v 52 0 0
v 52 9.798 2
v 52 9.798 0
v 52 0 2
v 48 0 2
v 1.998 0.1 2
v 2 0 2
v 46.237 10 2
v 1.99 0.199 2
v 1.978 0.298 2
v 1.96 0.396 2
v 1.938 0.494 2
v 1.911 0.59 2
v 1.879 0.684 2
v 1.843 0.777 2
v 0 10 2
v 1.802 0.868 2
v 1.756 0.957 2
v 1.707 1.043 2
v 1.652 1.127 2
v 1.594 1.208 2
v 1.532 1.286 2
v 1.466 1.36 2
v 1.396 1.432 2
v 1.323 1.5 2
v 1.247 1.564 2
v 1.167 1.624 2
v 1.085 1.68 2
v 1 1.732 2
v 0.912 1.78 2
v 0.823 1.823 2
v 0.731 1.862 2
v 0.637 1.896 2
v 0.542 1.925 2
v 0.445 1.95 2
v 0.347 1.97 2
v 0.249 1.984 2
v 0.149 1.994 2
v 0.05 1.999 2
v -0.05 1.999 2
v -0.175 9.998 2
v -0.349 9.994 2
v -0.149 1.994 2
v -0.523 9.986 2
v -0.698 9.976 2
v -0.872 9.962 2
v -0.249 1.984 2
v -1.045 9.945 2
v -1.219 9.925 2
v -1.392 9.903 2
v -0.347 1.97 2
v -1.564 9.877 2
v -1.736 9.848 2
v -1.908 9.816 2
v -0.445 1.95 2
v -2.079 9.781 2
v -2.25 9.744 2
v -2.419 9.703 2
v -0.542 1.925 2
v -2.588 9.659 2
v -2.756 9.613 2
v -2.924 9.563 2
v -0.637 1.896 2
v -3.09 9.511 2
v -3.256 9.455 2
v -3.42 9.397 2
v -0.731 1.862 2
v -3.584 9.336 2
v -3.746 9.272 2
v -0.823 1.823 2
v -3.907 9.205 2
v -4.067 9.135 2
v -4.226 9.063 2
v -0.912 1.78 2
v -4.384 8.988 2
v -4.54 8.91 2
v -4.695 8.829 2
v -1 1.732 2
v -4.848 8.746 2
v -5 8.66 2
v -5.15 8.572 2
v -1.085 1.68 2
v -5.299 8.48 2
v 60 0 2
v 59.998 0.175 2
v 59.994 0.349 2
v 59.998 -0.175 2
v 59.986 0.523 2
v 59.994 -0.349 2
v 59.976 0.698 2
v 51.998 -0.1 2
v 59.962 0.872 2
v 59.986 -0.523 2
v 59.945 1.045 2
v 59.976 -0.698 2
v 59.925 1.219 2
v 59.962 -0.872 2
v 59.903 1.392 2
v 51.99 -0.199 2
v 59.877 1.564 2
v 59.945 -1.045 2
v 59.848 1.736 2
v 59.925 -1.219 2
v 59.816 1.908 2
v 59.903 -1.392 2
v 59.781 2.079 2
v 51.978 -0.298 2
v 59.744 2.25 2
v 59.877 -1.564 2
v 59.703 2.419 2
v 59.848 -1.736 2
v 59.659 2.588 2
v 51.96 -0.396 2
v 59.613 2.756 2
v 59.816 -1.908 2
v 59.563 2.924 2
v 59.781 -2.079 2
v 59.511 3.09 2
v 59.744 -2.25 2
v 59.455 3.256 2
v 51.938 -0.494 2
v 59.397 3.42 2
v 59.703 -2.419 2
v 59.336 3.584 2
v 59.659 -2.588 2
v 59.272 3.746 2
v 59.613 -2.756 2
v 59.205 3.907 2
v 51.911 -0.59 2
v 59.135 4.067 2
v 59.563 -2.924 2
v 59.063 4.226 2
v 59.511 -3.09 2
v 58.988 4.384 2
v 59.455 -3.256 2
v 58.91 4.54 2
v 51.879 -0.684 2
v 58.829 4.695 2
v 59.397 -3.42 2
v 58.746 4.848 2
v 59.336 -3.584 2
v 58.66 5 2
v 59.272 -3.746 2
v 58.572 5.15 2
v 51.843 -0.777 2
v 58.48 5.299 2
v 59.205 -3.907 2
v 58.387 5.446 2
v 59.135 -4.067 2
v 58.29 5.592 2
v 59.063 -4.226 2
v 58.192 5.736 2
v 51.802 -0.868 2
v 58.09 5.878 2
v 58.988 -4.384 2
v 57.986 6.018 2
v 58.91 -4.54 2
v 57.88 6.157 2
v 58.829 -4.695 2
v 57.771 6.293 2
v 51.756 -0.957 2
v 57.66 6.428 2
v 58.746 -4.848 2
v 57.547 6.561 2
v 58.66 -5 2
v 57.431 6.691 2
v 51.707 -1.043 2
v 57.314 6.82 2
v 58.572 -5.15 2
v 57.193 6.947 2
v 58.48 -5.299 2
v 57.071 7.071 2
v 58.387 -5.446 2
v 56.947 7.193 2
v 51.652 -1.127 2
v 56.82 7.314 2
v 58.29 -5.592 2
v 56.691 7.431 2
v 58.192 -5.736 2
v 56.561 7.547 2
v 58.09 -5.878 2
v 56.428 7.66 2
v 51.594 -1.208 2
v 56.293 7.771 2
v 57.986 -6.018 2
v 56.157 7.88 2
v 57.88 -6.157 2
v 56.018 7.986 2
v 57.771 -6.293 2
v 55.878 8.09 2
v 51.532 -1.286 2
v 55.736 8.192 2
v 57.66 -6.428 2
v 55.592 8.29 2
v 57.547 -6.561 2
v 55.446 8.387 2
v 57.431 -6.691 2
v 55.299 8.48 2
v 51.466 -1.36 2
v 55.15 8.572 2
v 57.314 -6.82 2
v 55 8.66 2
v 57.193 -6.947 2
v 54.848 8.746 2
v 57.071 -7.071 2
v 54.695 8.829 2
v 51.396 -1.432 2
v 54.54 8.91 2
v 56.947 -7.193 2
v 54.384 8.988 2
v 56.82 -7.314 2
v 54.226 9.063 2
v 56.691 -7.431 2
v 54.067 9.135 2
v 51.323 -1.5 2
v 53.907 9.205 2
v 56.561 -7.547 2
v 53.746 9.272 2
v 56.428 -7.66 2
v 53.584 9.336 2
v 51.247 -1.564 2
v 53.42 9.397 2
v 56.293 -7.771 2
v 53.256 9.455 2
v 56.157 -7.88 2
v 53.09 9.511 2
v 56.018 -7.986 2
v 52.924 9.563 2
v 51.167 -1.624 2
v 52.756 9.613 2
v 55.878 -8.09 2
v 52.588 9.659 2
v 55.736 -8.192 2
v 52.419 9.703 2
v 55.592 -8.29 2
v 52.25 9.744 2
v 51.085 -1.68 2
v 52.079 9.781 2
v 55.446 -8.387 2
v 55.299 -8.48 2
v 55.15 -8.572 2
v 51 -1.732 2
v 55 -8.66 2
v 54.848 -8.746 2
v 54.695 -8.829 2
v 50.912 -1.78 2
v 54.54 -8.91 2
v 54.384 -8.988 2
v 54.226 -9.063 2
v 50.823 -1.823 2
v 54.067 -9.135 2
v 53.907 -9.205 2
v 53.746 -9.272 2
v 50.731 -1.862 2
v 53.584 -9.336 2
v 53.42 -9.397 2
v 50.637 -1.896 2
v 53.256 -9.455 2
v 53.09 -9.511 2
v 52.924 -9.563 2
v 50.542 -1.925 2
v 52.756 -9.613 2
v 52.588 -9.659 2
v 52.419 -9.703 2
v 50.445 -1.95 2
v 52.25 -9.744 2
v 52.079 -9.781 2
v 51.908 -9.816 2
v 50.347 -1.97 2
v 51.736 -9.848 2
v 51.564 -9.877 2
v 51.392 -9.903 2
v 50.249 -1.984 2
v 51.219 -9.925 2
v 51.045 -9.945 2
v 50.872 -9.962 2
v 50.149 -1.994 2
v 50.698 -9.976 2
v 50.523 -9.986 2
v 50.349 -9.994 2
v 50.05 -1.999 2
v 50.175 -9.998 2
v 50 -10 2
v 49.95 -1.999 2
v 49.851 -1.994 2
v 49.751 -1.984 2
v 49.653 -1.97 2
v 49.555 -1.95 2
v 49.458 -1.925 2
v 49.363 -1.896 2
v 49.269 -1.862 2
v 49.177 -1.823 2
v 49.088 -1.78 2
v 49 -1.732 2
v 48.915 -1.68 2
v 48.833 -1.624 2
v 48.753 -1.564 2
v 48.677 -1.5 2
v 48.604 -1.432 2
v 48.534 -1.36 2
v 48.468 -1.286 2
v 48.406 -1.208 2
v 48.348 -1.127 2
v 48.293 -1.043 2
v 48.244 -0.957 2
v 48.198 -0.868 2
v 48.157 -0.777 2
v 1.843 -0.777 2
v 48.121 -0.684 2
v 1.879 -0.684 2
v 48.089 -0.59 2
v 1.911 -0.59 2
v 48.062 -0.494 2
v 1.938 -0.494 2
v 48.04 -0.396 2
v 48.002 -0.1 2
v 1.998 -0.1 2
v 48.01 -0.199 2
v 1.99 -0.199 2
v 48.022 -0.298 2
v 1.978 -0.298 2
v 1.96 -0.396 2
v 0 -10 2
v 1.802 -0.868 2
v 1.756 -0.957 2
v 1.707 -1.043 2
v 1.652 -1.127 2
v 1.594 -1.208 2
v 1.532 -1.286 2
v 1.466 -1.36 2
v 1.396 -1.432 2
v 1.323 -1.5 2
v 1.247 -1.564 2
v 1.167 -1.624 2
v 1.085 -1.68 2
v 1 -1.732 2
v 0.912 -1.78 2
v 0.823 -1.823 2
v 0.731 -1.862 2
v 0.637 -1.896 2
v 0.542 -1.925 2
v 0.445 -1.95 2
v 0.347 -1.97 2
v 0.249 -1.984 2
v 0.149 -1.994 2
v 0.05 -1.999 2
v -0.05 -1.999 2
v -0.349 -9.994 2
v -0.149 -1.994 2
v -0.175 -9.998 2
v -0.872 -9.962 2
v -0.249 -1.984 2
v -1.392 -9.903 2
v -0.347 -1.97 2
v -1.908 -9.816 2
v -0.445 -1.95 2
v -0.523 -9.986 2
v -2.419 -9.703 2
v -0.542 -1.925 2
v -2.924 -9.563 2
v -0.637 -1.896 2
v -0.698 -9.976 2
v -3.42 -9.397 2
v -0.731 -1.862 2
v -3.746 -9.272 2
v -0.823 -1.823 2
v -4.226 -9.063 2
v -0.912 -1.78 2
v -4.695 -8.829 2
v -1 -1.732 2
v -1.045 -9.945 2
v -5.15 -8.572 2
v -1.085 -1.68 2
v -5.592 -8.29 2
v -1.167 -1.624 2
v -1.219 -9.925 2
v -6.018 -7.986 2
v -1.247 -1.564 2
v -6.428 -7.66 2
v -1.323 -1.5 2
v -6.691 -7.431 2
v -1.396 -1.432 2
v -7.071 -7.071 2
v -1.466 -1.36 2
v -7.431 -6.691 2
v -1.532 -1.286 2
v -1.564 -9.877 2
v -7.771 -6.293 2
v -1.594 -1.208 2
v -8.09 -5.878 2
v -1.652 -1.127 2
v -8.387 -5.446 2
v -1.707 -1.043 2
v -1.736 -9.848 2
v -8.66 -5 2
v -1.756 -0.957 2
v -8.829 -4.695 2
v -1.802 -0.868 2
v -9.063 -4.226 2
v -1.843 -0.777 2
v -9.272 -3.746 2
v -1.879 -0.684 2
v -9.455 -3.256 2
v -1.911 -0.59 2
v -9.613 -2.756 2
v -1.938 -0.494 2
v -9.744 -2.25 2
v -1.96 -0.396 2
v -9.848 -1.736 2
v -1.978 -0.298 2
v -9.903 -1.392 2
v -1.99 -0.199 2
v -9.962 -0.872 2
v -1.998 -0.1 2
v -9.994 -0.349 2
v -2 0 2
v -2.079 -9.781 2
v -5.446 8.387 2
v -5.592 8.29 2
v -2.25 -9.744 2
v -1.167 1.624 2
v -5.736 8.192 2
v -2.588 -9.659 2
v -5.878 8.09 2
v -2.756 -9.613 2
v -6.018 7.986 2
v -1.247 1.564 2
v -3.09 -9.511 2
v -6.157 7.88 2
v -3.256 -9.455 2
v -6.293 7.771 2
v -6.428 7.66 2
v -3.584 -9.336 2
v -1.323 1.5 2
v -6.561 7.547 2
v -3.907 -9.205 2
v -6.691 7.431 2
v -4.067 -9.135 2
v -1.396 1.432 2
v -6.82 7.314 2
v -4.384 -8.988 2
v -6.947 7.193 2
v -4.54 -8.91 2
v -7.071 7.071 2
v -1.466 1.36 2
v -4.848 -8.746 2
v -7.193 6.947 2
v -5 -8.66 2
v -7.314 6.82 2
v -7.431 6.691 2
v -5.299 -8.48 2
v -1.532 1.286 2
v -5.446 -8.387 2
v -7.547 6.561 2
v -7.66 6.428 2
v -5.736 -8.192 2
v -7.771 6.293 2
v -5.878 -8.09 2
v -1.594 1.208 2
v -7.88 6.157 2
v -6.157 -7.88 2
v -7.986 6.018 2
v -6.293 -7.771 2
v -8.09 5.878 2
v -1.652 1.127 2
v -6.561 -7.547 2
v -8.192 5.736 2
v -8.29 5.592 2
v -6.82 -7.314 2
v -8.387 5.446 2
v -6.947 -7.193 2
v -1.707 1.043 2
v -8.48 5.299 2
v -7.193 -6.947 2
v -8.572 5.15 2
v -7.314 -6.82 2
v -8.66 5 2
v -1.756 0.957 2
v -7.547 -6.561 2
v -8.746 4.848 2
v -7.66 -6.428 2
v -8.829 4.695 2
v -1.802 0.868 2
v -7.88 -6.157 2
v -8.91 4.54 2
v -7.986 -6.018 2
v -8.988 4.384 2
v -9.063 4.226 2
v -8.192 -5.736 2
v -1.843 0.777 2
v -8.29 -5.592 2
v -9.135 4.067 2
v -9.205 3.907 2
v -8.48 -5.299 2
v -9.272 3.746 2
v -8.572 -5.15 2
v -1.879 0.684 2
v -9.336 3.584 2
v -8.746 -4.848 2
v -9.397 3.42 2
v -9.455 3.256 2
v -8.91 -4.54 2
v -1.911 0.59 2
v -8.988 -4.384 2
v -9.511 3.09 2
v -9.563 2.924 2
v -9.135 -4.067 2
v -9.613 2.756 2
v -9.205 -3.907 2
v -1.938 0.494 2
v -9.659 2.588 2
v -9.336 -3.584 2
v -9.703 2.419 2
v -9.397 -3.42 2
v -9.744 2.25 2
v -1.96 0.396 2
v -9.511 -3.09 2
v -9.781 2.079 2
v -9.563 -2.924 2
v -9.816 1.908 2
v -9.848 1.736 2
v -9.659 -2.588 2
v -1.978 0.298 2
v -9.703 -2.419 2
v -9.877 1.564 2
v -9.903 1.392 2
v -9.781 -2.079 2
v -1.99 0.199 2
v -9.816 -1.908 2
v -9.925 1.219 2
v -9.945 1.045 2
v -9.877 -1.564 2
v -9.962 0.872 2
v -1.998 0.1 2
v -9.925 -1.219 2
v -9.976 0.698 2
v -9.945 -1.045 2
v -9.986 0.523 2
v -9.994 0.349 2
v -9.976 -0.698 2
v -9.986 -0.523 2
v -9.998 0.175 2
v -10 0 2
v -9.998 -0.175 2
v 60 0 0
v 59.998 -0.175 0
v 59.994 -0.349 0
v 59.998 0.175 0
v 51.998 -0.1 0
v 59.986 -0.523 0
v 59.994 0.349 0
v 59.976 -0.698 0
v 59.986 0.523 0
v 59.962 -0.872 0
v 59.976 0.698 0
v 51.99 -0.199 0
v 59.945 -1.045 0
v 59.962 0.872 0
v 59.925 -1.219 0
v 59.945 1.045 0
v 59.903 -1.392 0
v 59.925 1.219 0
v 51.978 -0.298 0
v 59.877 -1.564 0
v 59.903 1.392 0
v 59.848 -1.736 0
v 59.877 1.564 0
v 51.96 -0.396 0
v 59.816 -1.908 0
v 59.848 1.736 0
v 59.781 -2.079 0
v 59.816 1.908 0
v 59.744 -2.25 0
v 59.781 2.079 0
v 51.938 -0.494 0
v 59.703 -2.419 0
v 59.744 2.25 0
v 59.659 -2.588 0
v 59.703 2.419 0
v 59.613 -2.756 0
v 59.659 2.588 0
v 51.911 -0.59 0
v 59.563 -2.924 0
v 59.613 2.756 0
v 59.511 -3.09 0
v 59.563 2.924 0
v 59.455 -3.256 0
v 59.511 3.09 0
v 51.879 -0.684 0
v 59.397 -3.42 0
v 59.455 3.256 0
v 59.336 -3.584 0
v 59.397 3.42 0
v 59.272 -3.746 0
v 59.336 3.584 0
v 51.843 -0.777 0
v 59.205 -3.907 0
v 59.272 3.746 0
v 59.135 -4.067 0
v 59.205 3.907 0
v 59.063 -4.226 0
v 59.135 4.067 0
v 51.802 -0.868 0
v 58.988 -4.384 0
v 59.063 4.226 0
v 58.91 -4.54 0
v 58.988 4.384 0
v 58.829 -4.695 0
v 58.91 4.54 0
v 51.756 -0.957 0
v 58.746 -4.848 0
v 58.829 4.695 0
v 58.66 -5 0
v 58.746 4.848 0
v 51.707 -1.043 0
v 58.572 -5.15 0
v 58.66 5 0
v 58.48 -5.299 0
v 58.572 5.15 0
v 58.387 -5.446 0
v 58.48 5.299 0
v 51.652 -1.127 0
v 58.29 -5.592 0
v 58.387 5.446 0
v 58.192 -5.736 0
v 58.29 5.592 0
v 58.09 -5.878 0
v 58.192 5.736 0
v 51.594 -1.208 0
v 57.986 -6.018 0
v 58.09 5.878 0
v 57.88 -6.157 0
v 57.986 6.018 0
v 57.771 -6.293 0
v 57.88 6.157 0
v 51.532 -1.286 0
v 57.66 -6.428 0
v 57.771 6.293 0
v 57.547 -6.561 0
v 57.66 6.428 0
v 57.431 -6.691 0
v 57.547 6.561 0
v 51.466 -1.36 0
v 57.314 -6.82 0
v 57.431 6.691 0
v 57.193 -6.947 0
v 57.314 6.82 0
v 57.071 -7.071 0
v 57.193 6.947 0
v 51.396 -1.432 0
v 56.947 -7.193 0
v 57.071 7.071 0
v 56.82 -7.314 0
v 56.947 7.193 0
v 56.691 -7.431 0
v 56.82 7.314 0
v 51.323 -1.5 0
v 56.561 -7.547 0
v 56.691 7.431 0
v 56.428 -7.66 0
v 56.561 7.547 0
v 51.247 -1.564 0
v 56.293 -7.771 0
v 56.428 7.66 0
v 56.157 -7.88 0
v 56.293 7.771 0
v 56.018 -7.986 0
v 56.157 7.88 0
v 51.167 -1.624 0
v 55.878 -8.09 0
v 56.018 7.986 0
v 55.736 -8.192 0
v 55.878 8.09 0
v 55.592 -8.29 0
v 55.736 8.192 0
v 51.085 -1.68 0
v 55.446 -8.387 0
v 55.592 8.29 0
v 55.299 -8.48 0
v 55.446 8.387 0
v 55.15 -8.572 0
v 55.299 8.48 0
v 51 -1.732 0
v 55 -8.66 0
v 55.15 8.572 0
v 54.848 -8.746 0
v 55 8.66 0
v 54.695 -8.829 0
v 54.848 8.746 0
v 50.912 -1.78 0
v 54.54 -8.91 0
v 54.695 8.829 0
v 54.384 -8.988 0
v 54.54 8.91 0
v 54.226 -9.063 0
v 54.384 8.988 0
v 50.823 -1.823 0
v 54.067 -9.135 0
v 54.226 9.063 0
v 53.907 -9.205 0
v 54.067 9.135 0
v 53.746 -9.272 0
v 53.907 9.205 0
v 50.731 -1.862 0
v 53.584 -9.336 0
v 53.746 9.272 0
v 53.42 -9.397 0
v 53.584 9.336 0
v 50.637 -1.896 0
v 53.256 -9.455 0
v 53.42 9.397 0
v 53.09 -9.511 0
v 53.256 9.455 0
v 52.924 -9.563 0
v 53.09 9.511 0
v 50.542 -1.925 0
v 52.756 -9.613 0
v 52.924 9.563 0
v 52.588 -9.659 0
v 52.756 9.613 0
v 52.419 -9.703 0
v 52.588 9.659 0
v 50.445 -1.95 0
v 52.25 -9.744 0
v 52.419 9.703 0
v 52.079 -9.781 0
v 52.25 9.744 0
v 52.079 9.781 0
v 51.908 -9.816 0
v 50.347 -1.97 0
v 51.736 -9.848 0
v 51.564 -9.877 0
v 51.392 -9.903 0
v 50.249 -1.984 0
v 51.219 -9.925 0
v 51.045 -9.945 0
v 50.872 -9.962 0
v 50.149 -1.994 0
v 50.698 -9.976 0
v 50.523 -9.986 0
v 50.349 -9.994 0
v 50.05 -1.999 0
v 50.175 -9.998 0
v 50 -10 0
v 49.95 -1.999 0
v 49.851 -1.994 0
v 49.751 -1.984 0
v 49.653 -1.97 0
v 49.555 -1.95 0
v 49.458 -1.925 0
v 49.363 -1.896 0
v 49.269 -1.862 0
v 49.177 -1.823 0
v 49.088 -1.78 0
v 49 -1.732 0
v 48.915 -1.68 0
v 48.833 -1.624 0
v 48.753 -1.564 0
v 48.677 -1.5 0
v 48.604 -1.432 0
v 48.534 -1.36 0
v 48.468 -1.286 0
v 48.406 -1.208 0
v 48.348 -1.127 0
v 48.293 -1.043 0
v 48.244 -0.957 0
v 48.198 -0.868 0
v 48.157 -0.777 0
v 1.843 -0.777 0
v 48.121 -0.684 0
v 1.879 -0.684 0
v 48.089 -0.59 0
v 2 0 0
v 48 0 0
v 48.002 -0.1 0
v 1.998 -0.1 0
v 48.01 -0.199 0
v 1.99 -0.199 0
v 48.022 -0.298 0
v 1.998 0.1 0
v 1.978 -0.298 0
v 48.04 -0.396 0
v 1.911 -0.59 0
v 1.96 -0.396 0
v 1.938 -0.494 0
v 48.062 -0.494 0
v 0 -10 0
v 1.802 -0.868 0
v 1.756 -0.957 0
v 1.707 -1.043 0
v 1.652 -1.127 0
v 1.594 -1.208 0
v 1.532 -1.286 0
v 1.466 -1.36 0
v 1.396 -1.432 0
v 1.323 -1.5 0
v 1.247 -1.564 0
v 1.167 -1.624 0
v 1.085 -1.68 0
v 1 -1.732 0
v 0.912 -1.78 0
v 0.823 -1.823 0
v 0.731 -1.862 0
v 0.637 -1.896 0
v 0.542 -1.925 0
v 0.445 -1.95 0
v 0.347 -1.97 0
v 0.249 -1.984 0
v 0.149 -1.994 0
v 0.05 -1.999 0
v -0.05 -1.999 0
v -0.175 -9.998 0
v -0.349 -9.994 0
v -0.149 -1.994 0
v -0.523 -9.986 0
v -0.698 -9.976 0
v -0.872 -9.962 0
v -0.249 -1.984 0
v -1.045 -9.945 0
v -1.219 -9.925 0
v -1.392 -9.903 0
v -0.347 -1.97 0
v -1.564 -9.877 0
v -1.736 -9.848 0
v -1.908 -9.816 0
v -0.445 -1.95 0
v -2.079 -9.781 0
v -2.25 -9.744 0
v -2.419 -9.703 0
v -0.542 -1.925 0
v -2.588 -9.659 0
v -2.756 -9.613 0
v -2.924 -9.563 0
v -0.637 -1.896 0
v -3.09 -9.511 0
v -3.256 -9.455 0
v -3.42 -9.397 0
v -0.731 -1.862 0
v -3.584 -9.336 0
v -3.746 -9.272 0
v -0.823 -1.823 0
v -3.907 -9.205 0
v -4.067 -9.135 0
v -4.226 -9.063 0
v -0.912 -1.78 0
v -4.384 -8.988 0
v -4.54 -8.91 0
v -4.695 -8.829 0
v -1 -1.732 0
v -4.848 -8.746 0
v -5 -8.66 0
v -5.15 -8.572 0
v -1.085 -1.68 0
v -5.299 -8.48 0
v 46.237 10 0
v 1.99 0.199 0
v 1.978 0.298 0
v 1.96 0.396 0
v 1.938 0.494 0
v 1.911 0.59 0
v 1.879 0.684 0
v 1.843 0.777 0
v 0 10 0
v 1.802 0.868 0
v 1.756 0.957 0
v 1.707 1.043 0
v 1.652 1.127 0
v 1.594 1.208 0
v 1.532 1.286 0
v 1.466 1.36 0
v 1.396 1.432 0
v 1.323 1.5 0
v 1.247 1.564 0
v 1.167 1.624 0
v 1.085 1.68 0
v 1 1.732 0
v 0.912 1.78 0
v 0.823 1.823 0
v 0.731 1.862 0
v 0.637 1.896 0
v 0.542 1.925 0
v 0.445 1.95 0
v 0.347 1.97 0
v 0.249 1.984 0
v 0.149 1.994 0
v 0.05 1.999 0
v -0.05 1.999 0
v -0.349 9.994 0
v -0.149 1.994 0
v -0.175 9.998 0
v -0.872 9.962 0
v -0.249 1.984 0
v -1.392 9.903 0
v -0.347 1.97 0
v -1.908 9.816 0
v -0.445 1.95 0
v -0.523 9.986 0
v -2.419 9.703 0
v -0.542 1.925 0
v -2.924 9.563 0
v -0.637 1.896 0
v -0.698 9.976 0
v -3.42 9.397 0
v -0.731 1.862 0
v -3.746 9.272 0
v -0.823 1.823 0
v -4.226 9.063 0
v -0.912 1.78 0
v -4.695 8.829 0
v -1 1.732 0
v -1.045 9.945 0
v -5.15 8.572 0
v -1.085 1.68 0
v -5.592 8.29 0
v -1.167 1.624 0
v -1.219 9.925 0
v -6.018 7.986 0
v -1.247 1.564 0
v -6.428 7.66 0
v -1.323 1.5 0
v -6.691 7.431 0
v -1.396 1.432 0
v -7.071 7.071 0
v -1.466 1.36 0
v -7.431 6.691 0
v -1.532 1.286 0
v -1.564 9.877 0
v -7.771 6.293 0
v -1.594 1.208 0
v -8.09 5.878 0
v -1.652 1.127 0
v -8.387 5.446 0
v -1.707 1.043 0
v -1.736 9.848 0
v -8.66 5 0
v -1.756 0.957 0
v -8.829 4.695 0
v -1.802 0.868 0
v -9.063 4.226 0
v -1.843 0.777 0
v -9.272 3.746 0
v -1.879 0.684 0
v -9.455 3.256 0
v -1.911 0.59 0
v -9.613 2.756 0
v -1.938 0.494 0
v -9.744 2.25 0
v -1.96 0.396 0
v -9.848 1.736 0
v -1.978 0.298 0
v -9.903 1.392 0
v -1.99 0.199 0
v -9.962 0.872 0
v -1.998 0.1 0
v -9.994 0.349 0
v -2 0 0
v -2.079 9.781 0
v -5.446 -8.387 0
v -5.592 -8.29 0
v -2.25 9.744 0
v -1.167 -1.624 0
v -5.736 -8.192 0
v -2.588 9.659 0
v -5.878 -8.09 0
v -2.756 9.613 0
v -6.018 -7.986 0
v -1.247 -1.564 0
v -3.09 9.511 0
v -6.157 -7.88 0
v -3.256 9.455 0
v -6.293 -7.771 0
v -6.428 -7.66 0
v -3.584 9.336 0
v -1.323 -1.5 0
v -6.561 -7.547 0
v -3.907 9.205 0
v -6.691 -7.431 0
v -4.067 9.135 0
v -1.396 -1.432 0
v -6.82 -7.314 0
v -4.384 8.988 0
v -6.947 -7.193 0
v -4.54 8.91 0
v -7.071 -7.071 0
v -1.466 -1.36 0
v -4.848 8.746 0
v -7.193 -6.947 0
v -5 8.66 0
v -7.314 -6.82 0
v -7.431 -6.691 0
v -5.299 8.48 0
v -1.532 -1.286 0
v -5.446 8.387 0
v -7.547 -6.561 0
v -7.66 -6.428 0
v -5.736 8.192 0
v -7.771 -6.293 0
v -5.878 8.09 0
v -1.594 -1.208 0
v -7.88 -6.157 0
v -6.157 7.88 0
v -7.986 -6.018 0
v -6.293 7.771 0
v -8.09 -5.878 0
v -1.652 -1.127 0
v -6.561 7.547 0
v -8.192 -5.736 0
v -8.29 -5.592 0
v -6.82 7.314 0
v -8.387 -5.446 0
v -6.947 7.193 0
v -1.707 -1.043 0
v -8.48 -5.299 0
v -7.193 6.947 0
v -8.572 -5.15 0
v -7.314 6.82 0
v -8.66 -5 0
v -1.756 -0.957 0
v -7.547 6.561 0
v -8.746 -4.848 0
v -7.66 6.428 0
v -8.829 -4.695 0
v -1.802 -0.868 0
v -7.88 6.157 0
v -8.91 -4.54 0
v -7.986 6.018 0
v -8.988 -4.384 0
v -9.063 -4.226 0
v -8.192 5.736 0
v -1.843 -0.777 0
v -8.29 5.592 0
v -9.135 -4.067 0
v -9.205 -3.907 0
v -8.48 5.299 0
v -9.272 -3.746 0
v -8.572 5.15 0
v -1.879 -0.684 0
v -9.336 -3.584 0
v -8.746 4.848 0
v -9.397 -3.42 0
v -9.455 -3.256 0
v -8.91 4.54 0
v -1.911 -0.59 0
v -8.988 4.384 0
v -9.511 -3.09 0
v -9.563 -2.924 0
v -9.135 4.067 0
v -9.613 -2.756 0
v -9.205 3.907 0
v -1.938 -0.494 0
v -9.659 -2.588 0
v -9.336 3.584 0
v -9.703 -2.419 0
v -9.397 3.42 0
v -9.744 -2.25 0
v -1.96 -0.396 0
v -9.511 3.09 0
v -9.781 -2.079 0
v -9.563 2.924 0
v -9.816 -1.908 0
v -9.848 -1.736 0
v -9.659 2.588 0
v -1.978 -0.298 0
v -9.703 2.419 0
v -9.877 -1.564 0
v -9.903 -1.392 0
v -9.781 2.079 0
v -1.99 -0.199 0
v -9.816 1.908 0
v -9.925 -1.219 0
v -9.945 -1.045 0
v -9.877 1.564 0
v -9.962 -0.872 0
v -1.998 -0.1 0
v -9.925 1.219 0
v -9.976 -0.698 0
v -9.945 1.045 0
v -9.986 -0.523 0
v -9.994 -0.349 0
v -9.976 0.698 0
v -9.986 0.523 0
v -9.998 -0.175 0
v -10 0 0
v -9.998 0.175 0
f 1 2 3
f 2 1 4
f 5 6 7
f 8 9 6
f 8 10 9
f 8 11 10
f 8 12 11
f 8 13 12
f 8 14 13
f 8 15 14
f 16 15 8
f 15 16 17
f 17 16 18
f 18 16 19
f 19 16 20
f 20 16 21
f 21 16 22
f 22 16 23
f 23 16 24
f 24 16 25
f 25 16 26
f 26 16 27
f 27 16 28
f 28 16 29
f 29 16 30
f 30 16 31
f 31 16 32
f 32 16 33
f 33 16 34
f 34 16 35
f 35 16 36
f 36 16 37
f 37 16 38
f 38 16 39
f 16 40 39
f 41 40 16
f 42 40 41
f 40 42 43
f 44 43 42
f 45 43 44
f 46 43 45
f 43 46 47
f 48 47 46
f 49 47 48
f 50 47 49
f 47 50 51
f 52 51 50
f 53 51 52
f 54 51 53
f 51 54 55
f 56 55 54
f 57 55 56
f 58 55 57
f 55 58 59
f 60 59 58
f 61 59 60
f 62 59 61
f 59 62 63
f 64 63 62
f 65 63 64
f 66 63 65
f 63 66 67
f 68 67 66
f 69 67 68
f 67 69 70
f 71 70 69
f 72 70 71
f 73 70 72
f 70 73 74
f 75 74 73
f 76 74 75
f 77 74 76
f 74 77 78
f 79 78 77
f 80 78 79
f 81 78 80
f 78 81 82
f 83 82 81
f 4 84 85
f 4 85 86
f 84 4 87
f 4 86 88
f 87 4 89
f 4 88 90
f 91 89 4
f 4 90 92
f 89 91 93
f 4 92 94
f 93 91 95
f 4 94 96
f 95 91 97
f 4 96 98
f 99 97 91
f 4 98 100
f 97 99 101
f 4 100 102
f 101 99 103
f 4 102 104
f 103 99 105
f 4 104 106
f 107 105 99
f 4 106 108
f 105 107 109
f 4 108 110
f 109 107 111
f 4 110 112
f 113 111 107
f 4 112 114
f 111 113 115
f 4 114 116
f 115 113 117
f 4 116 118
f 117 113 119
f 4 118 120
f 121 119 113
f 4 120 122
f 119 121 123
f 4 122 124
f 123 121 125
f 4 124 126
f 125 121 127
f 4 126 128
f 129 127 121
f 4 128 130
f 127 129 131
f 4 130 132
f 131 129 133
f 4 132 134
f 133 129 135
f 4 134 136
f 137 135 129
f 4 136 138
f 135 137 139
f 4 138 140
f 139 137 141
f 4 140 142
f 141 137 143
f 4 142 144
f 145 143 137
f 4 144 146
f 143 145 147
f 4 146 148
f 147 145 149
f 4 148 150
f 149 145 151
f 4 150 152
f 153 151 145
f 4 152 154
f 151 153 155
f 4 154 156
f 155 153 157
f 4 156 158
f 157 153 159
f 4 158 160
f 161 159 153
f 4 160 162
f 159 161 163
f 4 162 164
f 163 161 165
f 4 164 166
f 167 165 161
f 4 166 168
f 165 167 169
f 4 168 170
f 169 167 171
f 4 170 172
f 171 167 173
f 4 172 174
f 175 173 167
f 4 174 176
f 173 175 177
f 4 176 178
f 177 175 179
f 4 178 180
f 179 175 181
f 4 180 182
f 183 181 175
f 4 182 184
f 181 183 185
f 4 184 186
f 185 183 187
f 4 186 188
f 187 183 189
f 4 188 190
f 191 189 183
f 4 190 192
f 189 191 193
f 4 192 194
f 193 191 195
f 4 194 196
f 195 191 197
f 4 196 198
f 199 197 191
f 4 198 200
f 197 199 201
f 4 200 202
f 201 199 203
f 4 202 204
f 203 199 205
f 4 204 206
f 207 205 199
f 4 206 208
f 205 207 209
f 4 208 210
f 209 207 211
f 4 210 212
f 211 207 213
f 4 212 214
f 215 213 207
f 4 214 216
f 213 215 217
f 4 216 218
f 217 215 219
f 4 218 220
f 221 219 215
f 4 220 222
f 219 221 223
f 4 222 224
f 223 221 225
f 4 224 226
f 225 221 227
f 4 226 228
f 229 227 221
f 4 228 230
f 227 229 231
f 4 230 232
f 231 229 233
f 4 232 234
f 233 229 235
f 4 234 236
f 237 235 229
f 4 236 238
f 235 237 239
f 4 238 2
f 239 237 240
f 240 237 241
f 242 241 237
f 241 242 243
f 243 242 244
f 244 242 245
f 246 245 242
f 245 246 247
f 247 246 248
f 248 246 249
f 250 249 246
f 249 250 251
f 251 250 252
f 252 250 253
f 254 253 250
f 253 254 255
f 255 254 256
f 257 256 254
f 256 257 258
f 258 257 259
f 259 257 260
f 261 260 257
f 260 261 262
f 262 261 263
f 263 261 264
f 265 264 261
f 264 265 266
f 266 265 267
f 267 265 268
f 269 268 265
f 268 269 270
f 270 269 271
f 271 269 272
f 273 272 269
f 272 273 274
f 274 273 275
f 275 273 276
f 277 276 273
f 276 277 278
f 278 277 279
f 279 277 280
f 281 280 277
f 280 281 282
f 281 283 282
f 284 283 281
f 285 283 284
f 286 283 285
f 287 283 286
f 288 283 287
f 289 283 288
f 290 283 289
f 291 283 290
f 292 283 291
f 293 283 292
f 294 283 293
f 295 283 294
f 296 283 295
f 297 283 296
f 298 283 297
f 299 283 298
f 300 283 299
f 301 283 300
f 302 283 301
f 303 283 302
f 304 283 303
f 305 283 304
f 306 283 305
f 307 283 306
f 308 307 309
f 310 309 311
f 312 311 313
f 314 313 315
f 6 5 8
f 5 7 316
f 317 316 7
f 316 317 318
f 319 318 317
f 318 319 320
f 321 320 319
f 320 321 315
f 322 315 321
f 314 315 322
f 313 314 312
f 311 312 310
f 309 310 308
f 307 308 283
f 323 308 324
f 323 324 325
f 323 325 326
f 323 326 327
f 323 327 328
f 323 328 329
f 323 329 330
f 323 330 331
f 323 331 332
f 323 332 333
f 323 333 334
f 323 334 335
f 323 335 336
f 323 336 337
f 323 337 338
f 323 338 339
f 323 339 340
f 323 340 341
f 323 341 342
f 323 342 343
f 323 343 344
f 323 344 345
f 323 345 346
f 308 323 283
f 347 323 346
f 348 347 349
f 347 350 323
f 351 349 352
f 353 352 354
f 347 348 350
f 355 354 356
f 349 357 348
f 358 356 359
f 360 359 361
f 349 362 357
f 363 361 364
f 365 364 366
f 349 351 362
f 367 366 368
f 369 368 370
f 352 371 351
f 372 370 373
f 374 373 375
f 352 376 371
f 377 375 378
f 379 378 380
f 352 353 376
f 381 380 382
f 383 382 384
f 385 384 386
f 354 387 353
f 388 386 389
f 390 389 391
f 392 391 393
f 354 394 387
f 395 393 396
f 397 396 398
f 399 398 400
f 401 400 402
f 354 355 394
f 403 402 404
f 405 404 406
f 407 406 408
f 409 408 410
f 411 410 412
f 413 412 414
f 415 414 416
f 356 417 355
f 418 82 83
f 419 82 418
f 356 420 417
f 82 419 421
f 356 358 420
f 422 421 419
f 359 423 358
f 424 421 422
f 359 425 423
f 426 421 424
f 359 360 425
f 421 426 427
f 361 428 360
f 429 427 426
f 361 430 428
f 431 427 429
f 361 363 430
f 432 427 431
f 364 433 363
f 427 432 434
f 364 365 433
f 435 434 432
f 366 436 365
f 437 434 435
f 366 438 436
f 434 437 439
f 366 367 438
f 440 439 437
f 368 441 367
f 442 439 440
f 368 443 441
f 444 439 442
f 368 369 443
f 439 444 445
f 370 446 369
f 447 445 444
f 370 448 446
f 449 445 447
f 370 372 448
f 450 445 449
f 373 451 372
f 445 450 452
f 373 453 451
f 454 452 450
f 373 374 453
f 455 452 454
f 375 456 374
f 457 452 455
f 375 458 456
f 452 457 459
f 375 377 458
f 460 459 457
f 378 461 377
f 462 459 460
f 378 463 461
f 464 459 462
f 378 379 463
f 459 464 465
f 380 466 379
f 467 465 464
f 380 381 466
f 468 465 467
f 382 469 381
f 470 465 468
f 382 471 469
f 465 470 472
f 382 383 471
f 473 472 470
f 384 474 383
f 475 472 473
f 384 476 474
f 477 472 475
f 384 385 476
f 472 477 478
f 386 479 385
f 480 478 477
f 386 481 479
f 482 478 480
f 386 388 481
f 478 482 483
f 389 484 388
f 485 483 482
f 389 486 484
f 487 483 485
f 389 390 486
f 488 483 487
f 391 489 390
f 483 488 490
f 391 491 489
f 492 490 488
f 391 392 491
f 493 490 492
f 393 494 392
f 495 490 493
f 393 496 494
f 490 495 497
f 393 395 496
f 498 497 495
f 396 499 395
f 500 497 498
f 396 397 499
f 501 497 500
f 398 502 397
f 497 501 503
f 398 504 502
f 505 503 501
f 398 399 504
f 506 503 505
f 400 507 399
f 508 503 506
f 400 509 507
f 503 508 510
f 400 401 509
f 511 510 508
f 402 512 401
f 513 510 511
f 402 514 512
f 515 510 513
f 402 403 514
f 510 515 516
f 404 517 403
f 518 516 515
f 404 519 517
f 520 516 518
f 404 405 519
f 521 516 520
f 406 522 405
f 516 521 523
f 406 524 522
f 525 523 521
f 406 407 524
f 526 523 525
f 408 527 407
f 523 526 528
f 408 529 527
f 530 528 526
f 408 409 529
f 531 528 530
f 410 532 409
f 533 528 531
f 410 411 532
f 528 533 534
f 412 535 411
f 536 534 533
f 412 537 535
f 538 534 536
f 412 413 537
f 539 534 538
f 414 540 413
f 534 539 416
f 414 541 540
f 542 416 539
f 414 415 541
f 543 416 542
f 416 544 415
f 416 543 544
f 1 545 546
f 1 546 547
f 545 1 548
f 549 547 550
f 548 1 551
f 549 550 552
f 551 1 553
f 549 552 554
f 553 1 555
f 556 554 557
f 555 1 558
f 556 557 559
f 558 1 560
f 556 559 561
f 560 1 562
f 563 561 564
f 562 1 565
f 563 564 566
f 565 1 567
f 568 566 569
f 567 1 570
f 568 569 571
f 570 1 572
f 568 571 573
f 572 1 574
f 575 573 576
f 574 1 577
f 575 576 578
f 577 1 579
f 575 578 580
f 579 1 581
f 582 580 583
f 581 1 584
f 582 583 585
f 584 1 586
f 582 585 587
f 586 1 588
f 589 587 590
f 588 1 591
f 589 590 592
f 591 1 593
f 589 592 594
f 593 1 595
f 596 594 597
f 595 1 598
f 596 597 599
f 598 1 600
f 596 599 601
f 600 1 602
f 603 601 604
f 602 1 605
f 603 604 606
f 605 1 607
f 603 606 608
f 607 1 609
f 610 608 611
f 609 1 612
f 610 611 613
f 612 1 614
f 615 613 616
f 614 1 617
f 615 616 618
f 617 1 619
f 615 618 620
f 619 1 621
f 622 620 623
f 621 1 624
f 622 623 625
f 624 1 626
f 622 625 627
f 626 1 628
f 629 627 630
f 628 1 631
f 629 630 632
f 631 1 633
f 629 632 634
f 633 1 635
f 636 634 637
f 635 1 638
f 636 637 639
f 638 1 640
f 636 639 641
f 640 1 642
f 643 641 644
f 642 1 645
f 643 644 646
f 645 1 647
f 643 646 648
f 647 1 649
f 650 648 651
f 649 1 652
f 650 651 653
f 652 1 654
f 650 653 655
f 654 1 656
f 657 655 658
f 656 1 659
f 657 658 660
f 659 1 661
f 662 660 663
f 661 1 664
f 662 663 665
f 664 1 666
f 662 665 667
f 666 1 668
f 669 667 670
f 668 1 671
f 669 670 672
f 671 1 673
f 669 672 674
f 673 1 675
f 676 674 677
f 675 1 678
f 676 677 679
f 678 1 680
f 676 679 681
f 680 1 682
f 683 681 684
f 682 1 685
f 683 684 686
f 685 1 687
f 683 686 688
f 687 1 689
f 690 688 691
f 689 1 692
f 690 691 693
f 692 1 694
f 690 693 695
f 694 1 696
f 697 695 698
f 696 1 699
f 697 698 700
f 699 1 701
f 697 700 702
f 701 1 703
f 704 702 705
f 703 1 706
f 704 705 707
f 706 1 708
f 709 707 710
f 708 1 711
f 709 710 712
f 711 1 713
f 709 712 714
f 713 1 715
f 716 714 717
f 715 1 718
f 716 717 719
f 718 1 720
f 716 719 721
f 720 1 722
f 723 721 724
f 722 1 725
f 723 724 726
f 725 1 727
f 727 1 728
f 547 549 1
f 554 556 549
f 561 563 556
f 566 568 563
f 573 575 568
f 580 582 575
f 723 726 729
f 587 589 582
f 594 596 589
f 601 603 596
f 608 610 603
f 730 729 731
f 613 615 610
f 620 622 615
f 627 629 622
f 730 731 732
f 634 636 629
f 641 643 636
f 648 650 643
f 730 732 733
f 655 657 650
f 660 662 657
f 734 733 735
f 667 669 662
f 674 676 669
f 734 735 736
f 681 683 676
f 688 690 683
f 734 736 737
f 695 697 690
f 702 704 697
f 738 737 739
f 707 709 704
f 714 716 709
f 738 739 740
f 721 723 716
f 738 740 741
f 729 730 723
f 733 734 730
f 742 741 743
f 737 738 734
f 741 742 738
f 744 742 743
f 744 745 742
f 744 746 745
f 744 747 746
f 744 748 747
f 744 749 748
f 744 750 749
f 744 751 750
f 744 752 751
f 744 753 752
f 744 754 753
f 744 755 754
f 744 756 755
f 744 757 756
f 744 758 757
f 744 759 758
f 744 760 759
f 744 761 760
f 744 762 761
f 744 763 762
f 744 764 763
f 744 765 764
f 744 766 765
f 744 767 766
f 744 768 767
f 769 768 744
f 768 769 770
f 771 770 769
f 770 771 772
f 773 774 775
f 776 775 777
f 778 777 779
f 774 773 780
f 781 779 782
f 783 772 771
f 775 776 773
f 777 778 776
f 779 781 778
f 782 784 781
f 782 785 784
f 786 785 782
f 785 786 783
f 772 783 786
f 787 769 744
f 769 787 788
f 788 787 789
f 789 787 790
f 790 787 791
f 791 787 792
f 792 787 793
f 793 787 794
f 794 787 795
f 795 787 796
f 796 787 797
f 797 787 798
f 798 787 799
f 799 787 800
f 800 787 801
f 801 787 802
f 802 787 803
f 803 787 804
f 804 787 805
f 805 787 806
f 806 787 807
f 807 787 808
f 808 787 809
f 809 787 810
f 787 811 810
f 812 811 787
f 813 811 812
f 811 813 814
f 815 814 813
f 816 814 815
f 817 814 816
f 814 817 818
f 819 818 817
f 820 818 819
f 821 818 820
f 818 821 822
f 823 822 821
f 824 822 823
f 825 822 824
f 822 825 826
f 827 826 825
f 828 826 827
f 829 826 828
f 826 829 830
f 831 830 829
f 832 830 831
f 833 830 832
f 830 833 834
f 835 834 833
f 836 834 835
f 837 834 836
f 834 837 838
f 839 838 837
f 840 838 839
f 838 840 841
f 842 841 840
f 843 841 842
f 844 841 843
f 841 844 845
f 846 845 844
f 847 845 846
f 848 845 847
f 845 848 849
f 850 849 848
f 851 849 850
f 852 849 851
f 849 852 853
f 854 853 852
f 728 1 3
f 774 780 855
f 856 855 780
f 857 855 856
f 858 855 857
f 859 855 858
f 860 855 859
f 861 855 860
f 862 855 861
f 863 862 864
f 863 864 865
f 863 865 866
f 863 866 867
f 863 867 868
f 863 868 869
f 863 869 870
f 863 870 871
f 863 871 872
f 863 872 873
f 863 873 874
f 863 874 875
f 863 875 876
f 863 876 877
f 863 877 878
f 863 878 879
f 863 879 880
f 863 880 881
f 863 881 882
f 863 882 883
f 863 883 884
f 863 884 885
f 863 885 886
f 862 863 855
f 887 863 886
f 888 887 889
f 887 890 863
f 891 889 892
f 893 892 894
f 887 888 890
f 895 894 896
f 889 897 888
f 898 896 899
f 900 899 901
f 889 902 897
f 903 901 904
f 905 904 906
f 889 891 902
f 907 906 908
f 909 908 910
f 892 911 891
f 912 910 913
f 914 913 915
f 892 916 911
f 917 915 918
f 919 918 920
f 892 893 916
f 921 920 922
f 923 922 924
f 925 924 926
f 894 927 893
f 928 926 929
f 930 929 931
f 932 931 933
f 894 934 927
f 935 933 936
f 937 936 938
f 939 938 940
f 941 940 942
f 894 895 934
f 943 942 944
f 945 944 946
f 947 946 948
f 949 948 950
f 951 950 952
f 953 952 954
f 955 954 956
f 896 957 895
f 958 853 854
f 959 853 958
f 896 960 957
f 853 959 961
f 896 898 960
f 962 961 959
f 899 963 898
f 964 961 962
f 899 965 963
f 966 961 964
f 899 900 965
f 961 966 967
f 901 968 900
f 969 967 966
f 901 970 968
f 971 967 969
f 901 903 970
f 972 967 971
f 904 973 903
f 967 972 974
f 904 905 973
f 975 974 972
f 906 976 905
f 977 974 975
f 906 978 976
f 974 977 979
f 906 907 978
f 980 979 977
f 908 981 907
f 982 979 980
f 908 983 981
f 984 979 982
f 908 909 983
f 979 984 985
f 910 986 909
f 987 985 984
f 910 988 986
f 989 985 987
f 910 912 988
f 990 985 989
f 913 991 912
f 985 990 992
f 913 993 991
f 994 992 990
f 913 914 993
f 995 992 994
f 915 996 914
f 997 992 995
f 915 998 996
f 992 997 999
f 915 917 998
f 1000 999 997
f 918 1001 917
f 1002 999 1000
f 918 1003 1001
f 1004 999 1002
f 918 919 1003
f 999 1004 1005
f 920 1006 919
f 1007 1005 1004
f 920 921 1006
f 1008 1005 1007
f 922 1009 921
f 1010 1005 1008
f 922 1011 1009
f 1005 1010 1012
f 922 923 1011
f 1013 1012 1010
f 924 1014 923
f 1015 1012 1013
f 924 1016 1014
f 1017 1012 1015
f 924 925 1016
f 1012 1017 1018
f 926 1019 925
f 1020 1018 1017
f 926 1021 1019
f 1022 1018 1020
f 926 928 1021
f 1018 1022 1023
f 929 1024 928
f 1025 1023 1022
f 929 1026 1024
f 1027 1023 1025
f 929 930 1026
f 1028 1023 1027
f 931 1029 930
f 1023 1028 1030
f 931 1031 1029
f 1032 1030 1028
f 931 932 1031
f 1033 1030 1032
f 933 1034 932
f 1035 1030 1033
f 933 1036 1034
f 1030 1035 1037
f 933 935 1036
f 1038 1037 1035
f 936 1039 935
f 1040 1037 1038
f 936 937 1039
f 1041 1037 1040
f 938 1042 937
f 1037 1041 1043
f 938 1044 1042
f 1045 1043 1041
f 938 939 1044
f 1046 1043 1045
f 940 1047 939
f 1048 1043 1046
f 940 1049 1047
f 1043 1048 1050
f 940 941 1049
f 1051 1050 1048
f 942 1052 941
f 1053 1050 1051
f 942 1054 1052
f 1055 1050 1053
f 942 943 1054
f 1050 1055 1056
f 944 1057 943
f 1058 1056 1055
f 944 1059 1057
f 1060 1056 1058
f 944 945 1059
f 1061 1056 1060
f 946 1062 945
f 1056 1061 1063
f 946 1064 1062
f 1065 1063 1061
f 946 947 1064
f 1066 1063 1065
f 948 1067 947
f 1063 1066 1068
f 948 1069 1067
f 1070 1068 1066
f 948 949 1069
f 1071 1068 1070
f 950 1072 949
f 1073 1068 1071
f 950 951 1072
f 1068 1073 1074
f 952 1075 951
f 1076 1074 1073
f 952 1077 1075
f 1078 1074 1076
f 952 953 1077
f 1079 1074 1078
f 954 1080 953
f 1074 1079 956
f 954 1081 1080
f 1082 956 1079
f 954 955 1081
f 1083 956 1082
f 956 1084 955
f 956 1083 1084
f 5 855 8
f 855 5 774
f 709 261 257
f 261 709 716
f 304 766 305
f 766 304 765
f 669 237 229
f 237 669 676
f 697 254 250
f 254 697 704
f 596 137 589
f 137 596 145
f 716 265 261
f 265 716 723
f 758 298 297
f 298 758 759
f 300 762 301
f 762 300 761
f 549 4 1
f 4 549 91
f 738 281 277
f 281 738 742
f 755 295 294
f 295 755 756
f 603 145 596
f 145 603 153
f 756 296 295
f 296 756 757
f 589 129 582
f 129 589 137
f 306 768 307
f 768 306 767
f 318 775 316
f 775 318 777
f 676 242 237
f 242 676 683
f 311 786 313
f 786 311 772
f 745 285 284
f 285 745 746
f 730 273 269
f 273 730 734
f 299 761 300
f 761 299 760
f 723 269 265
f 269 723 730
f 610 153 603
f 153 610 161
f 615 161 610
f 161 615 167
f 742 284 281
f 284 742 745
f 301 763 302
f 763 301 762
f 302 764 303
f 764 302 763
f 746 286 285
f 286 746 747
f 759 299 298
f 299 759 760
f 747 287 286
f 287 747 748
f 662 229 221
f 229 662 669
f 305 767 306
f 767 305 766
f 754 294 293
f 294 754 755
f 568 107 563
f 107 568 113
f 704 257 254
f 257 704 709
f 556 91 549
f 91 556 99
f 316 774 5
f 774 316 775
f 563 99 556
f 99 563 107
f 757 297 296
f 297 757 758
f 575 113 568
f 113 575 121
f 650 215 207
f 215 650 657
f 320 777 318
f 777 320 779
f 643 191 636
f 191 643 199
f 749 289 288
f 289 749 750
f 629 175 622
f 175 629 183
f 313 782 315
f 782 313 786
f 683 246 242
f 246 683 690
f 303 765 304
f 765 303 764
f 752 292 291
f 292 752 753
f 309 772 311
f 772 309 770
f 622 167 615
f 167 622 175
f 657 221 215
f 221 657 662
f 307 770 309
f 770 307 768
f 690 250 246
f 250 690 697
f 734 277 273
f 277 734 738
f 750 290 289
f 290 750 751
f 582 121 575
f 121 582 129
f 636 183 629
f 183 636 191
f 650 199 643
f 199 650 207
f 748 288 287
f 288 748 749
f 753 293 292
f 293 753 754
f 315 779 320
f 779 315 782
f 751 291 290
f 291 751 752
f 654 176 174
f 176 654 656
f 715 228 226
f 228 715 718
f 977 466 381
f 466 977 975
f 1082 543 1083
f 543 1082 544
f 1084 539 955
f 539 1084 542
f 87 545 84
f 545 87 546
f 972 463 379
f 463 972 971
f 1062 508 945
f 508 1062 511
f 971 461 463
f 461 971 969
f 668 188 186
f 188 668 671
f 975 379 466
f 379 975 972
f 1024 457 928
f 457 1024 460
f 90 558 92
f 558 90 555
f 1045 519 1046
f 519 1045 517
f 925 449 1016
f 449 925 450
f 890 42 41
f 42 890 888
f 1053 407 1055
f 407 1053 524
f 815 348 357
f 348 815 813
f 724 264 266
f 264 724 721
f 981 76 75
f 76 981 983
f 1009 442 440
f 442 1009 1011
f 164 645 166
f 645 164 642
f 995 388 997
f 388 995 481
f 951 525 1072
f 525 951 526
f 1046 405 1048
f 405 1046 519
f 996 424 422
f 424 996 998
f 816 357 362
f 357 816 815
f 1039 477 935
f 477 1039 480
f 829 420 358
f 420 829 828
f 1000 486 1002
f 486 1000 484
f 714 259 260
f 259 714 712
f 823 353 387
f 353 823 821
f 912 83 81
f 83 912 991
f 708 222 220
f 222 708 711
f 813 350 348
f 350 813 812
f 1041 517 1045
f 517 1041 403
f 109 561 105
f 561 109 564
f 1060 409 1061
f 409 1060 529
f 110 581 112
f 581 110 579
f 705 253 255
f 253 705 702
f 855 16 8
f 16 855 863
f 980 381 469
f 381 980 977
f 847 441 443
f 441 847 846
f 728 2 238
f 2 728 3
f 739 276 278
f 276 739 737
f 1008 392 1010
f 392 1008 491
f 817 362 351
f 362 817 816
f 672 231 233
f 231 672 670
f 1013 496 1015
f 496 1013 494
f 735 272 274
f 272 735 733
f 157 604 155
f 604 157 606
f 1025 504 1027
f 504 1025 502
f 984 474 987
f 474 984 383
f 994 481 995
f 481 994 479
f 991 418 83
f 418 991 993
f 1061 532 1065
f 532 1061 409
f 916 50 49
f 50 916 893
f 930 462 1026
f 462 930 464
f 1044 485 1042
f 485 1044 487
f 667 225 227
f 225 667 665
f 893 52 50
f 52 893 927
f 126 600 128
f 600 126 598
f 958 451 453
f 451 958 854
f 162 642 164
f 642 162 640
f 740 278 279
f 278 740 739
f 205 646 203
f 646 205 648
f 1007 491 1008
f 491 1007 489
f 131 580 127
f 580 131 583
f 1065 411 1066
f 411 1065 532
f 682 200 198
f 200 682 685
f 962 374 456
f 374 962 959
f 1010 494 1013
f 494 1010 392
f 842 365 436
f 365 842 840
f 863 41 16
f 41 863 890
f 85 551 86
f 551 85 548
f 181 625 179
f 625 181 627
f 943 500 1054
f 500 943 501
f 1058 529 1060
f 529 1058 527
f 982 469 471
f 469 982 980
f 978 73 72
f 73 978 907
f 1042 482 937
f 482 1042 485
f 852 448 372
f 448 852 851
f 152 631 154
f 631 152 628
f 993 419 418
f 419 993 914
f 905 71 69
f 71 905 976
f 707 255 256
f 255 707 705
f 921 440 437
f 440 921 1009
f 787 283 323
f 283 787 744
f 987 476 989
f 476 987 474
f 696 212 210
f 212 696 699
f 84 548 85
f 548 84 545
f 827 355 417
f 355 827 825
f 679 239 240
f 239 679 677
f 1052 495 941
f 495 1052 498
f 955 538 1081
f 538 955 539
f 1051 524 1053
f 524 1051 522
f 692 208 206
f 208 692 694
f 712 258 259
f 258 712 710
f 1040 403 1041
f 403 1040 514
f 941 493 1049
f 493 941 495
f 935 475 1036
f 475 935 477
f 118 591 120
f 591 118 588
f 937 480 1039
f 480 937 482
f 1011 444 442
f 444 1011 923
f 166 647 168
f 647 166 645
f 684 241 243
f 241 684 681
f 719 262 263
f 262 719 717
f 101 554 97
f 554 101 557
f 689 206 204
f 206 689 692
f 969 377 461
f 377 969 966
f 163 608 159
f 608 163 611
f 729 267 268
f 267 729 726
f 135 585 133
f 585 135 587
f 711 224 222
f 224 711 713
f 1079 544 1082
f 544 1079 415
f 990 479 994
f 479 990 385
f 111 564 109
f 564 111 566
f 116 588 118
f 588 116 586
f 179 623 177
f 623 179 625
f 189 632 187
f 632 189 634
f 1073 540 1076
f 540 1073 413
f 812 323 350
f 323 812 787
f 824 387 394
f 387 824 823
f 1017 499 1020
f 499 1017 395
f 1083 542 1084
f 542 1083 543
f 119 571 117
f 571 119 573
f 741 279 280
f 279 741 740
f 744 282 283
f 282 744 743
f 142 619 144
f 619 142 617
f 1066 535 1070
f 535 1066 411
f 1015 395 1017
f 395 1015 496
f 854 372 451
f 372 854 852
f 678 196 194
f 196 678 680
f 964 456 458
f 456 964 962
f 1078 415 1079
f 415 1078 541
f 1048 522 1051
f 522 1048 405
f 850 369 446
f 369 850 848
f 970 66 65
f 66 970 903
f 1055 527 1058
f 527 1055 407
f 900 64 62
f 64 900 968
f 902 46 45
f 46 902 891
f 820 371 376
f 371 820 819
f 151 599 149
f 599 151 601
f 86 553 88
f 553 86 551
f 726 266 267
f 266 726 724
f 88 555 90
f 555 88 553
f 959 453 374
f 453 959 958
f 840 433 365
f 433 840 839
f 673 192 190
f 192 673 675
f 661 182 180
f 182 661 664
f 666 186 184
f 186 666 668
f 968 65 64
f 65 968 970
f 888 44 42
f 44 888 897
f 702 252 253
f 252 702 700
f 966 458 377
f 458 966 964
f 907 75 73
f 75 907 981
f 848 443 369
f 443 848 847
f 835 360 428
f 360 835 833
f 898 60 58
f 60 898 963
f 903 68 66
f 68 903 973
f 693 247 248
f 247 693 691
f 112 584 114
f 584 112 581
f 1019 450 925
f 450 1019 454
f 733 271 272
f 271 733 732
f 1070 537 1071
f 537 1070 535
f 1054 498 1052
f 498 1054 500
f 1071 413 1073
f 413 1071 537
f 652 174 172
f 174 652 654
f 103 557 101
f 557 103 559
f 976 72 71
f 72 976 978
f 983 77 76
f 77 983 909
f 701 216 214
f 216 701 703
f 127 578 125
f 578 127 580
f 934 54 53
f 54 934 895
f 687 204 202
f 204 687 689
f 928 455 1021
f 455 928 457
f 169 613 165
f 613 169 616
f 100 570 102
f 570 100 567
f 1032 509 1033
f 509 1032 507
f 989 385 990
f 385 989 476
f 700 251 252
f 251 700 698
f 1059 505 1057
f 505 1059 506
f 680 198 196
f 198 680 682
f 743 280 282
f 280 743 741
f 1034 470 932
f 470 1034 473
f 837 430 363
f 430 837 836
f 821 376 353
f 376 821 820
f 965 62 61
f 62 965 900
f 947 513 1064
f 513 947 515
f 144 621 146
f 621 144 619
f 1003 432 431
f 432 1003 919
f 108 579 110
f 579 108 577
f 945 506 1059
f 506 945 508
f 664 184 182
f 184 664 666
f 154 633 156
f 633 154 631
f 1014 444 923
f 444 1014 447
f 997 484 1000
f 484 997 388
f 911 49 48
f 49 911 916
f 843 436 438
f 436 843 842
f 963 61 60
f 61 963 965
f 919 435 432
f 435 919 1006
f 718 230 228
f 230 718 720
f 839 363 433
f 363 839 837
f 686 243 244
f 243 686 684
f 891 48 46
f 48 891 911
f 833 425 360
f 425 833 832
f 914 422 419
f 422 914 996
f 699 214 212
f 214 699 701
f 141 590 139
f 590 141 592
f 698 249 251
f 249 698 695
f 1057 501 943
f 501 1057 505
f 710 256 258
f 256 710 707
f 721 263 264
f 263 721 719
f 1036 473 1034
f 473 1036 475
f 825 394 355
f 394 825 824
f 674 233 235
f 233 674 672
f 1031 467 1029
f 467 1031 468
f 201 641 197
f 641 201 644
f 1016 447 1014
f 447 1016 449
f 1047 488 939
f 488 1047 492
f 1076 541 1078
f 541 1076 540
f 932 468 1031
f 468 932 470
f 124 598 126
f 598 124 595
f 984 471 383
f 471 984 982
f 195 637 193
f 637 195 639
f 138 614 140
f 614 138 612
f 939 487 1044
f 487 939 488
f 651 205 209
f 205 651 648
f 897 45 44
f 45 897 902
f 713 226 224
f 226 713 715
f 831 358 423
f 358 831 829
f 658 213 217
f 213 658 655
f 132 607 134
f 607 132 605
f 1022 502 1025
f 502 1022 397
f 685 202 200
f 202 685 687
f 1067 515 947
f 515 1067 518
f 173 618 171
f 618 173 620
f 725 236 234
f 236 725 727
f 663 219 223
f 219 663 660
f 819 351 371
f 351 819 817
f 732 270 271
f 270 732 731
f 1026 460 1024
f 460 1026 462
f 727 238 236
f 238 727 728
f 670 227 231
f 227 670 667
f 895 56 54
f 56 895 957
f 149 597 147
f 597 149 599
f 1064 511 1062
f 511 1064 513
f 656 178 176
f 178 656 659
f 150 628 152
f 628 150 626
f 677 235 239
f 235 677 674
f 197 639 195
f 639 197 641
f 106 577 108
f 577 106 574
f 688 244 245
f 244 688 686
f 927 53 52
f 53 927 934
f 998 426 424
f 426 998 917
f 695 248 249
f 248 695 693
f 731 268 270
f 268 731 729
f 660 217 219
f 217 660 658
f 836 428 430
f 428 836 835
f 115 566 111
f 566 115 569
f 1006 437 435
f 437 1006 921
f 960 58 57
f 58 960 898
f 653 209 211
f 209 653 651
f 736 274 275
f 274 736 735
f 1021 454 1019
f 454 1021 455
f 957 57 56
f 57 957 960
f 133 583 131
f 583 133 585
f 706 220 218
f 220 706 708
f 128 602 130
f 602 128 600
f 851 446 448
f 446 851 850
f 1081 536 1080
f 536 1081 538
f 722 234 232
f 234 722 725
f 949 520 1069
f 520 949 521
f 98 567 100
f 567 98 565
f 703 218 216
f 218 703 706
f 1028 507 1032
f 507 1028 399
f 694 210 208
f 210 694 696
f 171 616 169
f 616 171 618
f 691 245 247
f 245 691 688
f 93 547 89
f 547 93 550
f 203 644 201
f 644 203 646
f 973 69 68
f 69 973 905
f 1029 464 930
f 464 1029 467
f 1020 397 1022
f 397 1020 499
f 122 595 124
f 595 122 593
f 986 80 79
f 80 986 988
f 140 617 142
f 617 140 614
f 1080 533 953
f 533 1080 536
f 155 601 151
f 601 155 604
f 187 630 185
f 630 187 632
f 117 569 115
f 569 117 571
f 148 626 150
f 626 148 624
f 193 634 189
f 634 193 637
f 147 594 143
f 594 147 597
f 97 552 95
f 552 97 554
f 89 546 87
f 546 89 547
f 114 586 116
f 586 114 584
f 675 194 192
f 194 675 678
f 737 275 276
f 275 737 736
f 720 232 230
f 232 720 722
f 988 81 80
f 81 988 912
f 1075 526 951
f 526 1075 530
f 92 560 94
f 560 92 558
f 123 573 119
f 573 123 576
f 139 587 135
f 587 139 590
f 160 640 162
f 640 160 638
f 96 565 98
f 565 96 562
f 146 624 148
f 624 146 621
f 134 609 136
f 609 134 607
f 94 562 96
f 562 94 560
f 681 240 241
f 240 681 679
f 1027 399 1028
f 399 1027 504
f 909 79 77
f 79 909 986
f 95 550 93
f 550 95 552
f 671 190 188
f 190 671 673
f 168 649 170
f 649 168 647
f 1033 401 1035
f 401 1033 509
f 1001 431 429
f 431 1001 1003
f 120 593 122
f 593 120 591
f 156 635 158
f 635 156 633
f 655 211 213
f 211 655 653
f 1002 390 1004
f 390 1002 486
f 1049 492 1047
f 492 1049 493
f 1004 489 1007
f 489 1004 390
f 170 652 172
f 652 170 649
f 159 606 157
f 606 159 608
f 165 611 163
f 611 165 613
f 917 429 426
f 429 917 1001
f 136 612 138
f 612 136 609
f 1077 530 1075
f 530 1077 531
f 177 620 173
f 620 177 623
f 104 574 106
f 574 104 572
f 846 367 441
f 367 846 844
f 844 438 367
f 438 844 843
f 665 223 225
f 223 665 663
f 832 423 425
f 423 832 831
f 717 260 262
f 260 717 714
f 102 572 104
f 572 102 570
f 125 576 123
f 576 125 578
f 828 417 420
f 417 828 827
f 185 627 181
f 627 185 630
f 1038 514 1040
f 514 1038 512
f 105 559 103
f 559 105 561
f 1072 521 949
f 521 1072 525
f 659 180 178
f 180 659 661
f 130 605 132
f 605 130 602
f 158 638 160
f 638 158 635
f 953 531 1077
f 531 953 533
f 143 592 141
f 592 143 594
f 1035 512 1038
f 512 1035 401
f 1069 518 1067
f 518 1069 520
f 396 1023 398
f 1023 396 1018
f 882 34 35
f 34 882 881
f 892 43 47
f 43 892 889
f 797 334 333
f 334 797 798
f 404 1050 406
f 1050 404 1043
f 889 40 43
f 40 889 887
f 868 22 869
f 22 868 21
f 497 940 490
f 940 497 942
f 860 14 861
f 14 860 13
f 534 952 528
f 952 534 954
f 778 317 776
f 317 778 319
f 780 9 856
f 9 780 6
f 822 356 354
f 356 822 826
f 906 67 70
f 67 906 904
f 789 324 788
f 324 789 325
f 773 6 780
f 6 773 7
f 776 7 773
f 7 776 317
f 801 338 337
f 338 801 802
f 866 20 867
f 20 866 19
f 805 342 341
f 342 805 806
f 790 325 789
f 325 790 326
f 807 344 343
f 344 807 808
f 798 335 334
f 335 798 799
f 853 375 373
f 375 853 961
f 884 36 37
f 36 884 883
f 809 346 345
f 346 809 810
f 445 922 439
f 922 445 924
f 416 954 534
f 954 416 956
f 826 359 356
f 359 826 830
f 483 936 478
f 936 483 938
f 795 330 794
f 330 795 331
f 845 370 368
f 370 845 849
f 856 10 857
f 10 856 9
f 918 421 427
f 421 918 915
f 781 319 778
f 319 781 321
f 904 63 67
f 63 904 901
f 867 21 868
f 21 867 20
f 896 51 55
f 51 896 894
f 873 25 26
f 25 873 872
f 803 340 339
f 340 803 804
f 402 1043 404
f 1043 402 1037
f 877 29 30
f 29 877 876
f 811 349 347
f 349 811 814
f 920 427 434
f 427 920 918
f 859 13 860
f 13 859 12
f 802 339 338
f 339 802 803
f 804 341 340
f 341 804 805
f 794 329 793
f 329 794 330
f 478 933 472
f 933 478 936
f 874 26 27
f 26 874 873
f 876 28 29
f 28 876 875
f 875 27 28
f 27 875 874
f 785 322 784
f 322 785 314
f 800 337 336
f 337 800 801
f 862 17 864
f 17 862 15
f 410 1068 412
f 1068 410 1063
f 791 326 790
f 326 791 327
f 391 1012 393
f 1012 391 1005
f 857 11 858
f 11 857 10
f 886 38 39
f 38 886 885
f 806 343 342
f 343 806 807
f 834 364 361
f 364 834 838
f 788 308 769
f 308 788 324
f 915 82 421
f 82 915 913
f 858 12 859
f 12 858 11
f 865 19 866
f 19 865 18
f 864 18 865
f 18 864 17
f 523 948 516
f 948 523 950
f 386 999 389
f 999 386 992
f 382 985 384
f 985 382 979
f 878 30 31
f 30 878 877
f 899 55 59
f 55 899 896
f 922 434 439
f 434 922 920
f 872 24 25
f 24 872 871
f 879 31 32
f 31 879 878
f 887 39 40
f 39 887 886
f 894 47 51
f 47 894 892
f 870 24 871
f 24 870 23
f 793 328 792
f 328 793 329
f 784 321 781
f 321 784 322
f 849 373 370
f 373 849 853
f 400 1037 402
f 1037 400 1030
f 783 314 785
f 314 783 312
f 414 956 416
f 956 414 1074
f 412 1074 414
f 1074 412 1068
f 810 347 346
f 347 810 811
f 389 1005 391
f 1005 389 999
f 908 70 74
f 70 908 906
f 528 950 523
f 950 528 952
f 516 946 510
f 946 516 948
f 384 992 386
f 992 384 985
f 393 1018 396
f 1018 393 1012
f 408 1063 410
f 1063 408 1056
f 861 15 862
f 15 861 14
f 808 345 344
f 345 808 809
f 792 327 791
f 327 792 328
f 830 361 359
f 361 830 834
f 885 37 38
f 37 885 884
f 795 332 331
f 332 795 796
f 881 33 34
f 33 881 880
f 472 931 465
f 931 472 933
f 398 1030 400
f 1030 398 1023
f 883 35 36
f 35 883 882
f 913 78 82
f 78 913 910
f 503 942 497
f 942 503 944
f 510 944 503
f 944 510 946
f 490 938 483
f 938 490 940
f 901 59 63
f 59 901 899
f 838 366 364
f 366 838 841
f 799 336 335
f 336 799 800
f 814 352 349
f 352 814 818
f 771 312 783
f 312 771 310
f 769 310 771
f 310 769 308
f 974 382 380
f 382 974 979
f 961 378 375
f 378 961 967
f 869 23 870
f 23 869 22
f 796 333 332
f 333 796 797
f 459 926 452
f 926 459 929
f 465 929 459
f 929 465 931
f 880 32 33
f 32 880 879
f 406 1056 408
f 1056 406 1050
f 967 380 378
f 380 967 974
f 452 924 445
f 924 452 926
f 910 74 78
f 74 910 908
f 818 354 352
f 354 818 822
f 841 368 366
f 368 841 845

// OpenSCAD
distance = 50;
screw_radius = 2;
radius = 10;
thickness = 2;
$fs=0.1;
$fa=1;

difference() {
	hull() {
		cylinder(r=radius, h=thickness);
		translate([distance, 0, 0]) {
			cylinder(r=radius, h=thickness);
		}
	}
	cylinder(r=screw_radius, h=thickness);
	translate([distance, 0, 0]) {
		cylinder(r=screw_radius, h=thickness);
		translate([-screw_radius, 0, 0]) {
			cube([screw_radius * 2, radius, thickness]);
			rotate([0, 0, 10]) {
				cube([screw_radius * 2, radius * 100, thickness]);
			}
		}
	}
}
